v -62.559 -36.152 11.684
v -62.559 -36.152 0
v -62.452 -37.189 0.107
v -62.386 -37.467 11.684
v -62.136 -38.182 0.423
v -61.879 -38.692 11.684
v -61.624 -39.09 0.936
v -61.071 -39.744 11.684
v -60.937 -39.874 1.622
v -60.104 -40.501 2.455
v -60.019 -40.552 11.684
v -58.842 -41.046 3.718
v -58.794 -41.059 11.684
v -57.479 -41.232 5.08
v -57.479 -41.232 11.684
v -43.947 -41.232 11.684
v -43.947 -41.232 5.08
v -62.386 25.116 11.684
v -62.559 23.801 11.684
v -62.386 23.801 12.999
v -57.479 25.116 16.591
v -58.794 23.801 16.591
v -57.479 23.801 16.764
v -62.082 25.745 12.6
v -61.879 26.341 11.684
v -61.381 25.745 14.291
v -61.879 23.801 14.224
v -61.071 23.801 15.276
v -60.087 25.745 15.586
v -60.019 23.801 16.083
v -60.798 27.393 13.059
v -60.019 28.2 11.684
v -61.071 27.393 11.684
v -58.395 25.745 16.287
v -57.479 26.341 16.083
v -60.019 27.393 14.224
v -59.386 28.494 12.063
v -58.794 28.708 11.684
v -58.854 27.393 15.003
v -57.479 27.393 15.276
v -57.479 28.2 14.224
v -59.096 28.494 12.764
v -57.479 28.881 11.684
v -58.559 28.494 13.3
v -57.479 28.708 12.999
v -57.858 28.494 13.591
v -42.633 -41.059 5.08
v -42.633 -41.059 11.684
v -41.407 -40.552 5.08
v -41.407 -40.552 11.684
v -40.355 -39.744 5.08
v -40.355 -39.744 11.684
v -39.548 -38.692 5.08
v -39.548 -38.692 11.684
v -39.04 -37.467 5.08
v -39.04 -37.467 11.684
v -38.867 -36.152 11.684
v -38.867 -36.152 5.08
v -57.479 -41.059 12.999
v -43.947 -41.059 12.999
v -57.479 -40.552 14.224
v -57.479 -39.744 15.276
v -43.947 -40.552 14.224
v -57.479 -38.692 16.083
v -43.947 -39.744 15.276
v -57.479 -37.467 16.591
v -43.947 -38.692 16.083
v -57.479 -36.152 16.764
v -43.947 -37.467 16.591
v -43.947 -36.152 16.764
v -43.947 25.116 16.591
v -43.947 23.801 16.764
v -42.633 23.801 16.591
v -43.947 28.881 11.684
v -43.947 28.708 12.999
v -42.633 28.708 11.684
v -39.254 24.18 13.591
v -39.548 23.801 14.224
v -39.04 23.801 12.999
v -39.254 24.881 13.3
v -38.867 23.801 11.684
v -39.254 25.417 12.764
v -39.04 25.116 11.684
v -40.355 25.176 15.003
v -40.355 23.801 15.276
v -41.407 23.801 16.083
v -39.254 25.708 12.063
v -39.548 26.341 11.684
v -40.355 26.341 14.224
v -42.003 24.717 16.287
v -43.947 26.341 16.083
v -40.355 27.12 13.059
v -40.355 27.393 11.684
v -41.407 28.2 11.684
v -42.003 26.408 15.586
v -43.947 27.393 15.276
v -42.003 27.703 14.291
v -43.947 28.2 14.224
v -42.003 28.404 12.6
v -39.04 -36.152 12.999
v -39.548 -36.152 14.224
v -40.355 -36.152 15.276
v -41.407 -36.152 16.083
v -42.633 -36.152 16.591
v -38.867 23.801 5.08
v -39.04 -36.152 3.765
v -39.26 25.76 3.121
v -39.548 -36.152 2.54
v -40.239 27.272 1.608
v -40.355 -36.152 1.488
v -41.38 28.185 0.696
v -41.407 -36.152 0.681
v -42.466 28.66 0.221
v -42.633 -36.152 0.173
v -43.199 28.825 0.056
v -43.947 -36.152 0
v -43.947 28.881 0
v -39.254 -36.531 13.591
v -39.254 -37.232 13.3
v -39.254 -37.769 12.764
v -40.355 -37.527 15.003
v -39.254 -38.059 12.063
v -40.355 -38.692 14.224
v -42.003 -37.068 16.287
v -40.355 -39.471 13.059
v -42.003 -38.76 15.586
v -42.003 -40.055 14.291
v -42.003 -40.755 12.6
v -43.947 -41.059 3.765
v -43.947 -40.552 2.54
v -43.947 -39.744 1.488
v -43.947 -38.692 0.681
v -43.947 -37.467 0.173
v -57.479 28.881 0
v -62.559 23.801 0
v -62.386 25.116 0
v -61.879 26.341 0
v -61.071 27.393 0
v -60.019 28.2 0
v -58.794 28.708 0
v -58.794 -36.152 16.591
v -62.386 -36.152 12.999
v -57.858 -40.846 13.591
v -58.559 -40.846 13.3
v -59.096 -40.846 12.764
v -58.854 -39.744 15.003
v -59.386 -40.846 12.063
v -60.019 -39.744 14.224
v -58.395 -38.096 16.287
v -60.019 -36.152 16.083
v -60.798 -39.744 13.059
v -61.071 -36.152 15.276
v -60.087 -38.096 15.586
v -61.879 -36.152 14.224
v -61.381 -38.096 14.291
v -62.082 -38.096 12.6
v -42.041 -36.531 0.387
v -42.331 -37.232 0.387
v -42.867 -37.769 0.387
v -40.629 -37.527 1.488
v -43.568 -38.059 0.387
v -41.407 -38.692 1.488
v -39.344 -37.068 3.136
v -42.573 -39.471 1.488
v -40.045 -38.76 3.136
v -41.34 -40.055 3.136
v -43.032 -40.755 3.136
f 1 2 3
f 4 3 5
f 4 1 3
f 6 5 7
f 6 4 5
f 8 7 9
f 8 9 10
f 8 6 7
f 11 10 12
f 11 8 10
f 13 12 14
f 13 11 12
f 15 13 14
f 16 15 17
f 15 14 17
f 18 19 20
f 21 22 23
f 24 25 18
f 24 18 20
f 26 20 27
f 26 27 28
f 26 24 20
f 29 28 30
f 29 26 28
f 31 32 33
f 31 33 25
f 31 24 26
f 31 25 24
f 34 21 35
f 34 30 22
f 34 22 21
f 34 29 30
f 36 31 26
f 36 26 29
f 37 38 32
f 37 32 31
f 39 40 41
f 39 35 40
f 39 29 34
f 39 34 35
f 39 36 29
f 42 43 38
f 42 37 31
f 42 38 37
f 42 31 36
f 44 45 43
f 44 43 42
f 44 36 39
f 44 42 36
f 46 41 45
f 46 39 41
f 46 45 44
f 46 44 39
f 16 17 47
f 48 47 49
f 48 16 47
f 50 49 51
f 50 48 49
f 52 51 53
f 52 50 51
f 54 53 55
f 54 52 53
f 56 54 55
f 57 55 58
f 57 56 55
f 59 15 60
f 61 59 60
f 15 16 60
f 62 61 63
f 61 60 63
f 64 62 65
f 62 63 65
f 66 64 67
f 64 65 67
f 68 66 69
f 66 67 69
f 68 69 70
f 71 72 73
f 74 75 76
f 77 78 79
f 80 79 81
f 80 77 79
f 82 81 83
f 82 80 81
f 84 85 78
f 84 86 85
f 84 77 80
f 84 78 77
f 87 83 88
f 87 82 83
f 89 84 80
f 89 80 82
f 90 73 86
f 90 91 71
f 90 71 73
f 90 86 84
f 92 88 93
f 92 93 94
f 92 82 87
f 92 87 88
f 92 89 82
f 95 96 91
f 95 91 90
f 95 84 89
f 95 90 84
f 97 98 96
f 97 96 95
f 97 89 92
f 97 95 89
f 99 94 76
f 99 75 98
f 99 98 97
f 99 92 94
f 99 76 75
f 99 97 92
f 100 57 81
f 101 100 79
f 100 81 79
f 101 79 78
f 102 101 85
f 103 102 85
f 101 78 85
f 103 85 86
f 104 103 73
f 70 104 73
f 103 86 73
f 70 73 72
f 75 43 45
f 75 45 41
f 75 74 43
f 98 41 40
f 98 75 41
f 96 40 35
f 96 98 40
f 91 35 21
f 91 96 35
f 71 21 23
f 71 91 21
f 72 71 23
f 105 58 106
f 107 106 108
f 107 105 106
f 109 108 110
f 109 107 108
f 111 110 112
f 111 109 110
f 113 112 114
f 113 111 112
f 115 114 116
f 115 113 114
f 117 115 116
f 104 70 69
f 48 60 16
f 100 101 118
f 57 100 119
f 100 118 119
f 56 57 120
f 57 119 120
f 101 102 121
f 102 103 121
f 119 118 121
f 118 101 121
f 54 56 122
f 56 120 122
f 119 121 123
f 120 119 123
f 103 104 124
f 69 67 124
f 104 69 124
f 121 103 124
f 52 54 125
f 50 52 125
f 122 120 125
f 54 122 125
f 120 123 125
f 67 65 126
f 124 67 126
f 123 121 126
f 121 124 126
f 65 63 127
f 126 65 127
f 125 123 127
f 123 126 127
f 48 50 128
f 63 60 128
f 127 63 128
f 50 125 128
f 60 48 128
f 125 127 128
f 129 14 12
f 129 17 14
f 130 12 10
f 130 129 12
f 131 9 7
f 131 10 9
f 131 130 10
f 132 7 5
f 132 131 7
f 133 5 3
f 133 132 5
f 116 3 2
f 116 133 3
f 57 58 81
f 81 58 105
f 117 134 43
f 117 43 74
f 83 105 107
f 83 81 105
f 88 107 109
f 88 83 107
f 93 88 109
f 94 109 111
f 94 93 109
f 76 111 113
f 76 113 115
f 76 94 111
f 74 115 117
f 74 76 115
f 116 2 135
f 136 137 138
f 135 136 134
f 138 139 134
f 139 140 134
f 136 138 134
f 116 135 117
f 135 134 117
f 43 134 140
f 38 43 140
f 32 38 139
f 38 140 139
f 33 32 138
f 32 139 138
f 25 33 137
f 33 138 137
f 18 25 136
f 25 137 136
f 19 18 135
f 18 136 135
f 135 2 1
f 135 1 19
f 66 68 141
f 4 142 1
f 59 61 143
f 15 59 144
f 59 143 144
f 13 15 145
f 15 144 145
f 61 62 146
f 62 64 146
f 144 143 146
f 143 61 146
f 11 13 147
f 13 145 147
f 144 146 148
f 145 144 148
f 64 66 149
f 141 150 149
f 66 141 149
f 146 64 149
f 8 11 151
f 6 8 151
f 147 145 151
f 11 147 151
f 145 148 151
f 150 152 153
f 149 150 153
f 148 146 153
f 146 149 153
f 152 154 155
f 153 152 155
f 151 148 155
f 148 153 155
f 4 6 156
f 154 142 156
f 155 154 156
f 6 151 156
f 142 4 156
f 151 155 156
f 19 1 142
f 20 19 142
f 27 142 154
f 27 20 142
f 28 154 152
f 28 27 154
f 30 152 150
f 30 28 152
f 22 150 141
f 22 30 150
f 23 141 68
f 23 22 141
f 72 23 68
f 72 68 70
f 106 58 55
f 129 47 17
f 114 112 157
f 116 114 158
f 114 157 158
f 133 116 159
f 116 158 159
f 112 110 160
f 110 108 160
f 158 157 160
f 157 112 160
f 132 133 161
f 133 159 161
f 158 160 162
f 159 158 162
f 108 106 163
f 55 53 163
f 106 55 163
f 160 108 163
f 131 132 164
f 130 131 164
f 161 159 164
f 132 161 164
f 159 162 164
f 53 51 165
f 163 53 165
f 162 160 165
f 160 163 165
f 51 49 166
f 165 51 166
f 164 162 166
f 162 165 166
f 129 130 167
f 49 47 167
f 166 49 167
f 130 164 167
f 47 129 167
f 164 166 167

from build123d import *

# Parameters (mm, degrees)
F0_W        = 23.691739887
F0_H        = 70.1130926609
F1_DEPTH    = 16.764
F2_R        = 5.08
F3_T1_DEPTH = 24.384
F3_S5_W     = 5.08
F3_S5_H     = 5.08
F3_T6_DEPTH = 5.08


# Not quite as in the source:
# - a fillet or chamfer that OpenCascade refuses, or shapes differently, is made with other operations: its cross-section is extruded or revolved along the edge and cut away or added


with BuildPart() as f1:
    # F0 (on Top) → F1 (new body)
    with BuildSketch(Plane.XY):
        with Locations((-50.7132504135, -6.1756633222)):
            Rectangle(F0_W, F0_H)
    extrude(amount=F1_DEPTH)

    # F2
    f2_edges = [f1.edges().sort_by_distance(p)[0] for p in [
        (-50.71325, 28.880883, 16.764),
        (-62.55912, -6.175663, 16.764),
        (-50.71325, -41.23221, 16.764),
        (-38.86738, -6.175663, 16.764),
        (-38.86738, -41.23221, 8.382),
        (-38.86738, 28.880883, 8.382),
        (-38.86738, -6.175663, 0),
        (-62.55912, -41.23221, 8.382),
        (-50.71325, -41.23221, 0),
    ]]
    fillet(f2_edges, radius=F2_R)

    # F3: fillet of radius 5.08 on 1 edges, made by hand

    # F3_s2 → F3_t1 (cut)
    with BuildSketch(Plane.XY.offset(-12.7)):
        with BuildLine():
            ThreePointArc((-57.479120357, 28.8808830082), (-61.0712228055, 27.3929854567), (-62.559120357, 23.8008830082))
            Line((-62.559120357, 23.8008830082), (-62.559120357, 28.8808830082))
            Line((-62.559120357, 28.8808830082), (-57.479120357, 28.8808830082))
        make_face()
    extrude(amount=F3_T1_DEPTH, mode=Mode.SUBTRACT)


with BuildPart() as f3_tool4:
    # F3_s5 → F3_t6 (new body)
    with BuildSketch(Plane.XZ.offset(-23.8008830082)):
        with Locations((-60.019120357, 14.224)):
            Rectangle(F3_S5_W, F3_S5_H)
    extrude(amount=-F3_T6_DEPTH)

    # F3_s7 → F3_t8 (revolve, cut)
    with BuildSketch(Plane(origin=(-57.479120357, 23.8008830082, 11.684), x_dir=(0.7071067812, 0, -0.7071067812), z_dir=(0.7071067812, 0, 0.7071067812))):
        with BuildLine():
            ThreePointArc((0, -5.08), (5.08, 0), (0, 5.08))
            Line((0, 5.08), (0, -5.08))
        make_face()
    revolve(axis=Axis((-57.479120357, 23.8008830082, 11.684), (0, 1, 0)), mode=Mode.SUBTRACT)


with BuildPart() as f1_1:
    add(f1.part)

    # F3_t3: cut F3_tool4
    add(f3_tool4.part, mode=Mode.SUBTRACT)


solid = f1_1.part
